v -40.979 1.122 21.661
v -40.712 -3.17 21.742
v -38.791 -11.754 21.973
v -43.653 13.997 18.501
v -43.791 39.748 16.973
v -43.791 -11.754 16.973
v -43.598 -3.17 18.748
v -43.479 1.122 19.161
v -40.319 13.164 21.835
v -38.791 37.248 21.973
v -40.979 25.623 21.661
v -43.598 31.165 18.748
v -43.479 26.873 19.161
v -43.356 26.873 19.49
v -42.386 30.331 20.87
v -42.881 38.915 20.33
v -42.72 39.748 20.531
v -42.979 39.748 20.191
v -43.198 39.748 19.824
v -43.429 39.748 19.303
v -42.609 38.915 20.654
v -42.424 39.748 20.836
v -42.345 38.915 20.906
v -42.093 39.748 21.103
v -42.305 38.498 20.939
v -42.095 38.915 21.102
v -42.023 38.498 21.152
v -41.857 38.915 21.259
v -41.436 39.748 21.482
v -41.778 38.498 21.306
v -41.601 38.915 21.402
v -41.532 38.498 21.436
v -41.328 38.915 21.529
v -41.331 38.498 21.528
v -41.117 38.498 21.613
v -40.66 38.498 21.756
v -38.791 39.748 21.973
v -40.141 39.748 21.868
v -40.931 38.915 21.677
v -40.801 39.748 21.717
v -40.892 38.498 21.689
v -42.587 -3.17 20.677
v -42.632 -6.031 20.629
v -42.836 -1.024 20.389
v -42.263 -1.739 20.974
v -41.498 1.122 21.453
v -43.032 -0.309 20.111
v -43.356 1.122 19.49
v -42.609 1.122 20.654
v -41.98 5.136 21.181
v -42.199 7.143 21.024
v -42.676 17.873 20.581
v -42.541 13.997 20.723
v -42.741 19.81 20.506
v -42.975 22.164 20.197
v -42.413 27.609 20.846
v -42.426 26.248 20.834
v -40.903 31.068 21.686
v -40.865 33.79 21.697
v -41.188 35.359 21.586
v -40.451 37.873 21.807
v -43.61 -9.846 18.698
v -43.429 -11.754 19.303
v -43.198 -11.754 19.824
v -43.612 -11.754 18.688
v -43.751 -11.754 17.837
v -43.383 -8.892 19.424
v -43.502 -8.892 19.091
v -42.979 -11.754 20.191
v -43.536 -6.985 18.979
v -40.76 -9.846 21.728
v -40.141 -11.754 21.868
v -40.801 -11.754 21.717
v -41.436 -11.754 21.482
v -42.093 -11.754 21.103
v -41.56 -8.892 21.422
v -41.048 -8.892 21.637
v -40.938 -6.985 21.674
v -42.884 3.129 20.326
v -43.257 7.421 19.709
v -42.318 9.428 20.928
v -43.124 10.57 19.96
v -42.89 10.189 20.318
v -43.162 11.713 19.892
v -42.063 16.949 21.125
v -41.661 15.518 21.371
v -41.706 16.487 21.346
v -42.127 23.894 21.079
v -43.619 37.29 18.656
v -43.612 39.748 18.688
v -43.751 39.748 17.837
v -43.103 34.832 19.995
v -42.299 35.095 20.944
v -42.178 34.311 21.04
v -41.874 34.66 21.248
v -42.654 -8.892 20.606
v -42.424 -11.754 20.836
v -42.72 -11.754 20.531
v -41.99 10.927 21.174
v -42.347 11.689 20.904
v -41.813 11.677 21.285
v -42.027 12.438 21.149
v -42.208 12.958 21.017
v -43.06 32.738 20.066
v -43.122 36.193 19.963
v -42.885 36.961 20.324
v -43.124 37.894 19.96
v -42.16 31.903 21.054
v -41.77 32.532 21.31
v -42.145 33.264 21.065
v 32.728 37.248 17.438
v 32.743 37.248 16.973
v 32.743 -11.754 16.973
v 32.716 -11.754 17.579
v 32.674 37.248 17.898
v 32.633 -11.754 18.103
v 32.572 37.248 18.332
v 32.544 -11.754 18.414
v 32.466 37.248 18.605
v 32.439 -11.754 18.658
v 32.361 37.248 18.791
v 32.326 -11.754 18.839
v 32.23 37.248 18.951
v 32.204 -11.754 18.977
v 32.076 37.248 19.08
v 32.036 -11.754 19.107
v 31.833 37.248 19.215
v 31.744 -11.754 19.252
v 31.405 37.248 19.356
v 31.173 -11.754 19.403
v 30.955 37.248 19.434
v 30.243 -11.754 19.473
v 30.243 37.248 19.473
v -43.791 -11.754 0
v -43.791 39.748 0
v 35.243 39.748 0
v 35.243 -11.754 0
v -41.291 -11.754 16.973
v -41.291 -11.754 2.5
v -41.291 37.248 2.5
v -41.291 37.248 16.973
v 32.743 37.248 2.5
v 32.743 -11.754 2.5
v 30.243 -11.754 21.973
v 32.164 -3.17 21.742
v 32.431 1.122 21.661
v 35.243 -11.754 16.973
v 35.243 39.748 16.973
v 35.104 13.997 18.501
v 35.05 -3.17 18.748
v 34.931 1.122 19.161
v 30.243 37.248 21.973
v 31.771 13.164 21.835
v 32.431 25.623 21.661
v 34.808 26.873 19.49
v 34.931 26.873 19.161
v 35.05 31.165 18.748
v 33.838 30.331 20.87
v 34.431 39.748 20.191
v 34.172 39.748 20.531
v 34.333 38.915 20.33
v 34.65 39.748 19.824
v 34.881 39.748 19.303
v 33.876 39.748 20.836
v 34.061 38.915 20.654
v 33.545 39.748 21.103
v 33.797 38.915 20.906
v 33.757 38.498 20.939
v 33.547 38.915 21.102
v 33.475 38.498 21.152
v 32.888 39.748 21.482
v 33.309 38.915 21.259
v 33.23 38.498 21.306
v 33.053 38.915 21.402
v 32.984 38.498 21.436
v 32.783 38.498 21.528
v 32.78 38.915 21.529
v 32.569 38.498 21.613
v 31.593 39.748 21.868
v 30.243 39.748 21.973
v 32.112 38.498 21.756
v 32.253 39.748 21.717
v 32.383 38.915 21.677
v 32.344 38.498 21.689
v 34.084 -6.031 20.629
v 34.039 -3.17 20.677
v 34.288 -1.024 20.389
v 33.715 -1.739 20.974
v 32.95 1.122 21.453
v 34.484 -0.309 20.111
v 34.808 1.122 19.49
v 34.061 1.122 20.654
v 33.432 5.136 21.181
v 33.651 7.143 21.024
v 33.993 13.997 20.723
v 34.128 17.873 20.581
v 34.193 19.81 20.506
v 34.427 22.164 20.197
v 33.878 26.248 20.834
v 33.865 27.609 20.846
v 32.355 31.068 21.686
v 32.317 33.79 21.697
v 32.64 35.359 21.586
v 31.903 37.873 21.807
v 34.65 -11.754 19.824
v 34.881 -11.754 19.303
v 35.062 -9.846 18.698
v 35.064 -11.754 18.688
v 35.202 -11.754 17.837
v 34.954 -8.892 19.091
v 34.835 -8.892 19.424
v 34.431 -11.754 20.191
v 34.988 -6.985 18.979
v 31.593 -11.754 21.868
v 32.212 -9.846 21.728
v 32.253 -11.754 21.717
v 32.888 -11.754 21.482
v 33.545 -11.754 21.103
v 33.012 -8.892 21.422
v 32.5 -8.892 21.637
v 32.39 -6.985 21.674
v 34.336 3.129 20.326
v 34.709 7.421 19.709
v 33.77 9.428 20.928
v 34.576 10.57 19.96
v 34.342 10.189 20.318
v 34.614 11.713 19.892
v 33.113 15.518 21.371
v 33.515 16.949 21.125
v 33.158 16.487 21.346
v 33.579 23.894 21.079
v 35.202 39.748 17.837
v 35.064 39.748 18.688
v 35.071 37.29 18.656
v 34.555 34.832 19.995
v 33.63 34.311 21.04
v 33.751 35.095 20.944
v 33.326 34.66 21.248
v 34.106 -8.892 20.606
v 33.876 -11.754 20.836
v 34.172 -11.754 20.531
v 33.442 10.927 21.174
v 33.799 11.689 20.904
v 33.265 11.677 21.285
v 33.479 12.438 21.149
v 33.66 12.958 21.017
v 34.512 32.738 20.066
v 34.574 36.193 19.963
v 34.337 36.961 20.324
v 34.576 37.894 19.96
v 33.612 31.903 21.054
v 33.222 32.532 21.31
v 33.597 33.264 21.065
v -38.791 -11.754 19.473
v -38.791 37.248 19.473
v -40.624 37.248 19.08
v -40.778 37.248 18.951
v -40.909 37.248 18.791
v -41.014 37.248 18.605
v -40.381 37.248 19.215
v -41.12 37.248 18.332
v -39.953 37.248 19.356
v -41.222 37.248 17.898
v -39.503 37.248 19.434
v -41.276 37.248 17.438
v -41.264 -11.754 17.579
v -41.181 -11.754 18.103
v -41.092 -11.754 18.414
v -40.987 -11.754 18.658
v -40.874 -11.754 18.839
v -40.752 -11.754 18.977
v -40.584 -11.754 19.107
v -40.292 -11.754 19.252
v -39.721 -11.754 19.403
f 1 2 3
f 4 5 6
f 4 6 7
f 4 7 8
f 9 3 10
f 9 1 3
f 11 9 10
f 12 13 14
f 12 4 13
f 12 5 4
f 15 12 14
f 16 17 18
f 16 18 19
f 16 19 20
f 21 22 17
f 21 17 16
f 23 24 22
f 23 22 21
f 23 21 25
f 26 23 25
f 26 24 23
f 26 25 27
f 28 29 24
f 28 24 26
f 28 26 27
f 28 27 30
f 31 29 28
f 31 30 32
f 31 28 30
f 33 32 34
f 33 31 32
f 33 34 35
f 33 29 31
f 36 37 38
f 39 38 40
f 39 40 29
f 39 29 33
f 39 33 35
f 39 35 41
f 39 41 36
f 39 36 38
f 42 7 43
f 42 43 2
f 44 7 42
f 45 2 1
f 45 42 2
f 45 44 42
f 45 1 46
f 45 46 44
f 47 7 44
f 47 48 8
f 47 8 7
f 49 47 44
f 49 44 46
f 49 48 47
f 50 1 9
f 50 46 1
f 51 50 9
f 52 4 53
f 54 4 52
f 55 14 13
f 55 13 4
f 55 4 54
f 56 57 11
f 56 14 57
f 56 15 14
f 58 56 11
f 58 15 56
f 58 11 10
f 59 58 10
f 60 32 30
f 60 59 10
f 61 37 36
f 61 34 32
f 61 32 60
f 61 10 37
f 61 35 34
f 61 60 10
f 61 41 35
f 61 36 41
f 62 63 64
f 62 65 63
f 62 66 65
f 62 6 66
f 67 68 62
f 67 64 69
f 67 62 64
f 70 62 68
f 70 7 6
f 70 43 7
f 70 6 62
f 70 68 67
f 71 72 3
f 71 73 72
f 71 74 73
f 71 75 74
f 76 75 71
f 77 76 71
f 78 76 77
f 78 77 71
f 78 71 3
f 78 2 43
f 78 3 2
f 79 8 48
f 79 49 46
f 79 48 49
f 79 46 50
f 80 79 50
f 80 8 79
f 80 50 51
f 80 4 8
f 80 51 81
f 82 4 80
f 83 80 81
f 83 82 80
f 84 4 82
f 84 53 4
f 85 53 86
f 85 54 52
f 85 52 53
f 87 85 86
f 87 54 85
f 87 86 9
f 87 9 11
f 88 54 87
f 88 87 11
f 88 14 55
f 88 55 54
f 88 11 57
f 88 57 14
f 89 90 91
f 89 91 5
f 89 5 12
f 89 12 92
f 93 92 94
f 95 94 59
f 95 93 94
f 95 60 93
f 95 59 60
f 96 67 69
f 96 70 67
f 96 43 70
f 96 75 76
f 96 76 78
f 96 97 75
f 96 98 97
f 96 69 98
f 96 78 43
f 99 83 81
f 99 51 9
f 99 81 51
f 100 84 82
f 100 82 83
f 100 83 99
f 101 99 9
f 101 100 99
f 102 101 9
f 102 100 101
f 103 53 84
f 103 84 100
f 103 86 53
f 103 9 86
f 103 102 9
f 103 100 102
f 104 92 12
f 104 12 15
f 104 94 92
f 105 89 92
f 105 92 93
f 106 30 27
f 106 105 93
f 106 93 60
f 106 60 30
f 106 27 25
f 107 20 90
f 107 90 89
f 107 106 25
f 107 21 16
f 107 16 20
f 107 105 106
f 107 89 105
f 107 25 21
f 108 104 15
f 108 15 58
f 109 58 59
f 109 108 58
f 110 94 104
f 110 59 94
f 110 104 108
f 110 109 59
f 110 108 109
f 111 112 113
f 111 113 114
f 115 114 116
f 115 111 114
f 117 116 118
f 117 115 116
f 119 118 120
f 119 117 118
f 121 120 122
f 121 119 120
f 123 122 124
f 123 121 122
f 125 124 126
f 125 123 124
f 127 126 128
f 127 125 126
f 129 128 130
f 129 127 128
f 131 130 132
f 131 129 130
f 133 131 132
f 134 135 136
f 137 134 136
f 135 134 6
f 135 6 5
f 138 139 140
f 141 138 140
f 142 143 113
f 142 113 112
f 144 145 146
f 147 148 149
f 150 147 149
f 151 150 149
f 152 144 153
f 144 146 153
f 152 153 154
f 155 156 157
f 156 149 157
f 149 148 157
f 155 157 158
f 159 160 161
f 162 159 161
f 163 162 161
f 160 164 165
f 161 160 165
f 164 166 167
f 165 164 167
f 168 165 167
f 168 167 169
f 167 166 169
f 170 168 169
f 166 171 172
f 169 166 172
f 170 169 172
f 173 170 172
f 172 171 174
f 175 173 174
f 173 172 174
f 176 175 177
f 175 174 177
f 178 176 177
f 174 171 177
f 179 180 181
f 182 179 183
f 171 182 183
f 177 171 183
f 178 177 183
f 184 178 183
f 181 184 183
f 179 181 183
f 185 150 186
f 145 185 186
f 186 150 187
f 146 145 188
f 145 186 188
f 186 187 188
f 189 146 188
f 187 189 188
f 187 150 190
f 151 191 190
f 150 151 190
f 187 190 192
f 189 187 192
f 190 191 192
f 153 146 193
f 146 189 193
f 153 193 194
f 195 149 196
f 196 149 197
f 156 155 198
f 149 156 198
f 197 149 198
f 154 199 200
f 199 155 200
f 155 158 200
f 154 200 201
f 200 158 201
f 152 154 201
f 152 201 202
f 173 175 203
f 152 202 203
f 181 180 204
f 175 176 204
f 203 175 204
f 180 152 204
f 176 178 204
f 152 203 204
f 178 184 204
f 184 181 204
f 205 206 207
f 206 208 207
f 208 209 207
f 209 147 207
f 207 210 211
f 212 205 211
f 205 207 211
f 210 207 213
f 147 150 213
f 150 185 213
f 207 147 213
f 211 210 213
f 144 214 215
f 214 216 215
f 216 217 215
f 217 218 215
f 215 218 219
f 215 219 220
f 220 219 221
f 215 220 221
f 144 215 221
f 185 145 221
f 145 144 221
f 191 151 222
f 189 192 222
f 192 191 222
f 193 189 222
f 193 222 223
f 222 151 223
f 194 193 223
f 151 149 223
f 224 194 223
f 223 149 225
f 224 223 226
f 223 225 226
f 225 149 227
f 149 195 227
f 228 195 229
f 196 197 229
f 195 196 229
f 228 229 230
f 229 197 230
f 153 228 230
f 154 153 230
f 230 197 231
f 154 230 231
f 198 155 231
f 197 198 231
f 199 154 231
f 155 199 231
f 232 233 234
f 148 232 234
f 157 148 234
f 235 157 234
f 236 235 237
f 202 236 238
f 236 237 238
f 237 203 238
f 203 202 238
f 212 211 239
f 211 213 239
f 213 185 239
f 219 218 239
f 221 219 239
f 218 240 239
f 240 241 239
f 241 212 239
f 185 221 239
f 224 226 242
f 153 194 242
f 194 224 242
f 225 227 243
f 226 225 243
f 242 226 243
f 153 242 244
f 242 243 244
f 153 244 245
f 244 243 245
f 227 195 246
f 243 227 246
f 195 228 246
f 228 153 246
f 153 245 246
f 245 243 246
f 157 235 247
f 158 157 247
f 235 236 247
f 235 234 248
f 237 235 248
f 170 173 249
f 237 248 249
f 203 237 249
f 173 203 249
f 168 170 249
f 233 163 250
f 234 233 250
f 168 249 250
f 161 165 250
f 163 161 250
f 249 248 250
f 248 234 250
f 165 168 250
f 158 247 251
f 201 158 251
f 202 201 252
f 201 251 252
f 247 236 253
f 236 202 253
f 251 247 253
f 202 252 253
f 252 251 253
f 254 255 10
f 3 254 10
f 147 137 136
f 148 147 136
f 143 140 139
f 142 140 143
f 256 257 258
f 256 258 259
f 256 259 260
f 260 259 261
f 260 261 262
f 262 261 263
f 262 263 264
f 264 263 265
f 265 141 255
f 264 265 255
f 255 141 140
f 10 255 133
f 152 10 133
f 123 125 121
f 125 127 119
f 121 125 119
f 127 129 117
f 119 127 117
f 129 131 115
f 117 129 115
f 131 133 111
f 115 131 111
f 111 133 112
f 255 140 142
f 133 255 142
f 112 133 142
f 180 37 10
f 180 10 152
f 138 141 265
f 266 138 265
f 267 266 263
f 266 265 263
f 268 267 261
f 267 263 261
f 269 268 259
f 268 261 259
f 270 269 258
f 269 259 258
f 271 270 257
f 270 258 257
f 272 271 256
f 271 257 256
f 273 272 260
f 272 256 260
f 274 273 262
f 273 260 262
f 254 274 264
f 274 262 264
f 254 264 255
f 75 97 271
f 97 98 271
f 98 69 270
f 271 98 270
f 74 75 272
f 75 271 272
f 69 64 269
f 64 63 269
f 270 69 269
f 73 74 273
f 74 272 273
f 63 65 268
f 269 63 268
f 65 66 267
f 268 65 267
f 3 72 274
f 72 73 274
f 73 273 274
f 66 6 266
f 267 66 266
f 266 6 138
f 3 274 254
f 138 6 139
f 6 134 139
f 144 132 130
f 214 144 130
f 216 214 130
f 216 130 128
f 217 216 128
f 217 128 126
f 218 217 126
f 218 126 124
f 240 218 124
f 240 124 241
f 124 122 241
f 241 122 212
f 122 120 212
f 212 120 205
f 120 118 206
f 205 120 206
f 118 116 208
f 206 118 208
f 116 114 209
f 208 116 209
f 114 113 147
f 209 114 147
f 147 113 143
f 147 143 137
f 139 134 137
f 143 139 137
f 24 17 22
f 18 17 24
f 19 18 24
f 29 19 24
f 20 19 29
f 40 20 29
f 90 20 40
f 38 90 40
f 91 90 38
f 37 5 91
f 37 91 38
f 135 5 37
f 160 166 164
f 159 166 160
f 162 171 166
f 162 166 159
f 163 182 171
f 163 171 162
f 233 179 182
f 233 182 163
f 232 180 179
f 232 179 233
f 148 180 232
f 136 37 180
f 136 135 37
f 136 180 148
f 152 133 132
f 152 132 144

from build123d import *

# Parameters (mm, degrees)
F0_W        = 79.0347680449
F0_H        = 51.5021067113
F1_DEPTH    = 21.9734124839
F2_T1_DEPTH = 76.5021067113
F3_T        = 2.5


# Not quite as in the source:
# - a fillet or chamfer that OpenCascade refuses, or shapes differently, is made with other operations: its cross-section is extruded or revolved along the edge and cut away or added
# - a shell that OpenCascade refuses in one call is made with other operations: the cavity is built on its own and cut out


with BuildPart() as f1:
    # F0 (on Top) → F1 (new body)
    with BuildSketch(Plane.XY):
        with Locations((-4.2740143836, 13.997332193)):
            Rectangle(F0_W, F0_H)
    extrude(amount=F1_DEPTH)

    # F2: fillet of radius 5 on 2 edges, made by hand

    # F2_s2 → F2_t1 (cut)
    with BuildSketch(Plane.XZ.offset(-52.2483855486)):
        with BuildLine():
            add(Edge.make_bspline(
                [(-43.791398406, 16.9734124839), (-43.791398406, 21.9734124839), (-38.791398406, 21.9734124839)],
                knots=[0, 0, 0, 1, 1, 1], degree=2, weights=[1, 1, 1]))
            Line((-38.791398406, 21.9734124839), (-43.791398406, 21.9734124839))
            Line((-43.791398406, 21.9734124839), (-43.791398406, 16.9734124839))
        make_face()
        with BuildLine():
            add(Edge.make_bspline(
                [(35.2433696389, 16.9734124839), (35.2433696389, 21.9734124839), (30.2433696389, 21.9734124839)],
                knots=[0, 0, 0, 1, 1, 1], degree=2, weights=[1, 1, 1]))
            Line((30.2433696389, 21.9734124839), (35.2433696389, 21.9734124839))
            Line((35.2433696389, 21.9734124839), (35.2433696389, 16.9734124839))
        make_face()
    extrude(amount=F2_T1_DEPTH, mode=Mode.SUBTRACT)

    # F3: shell of thickness 2.5, made by hand


with BuildPart() as f3_core1:
    # F3_t2: copy of F1
    add(f1.part)

    # the walls: a layer under each face that stays
    f3_faces = [f3_core1.faces().sort_by_distance(p)[0] for p in [
        (-43.791398406, 13.997332193, 8.4867062419),
        (-4.2740143836, 13.997332193, 0),
        (-42.541398406, 13.997332193, 20.7234124839),
        (-4.2740143836, 39.7483855486, 10.986706242),
        (35.2433696389, 13.997332193, 8.4867062419),
        (33.9933696389, 13.997332193, 20.7234124839),
    ]]
    thicken(f3_faces, amount=-F3_T, mode=Mode.SUBTRACT)


with BuildPart() as f1_1:
    add(f1.part)

    # what is left inside the walls is the cavity
    f3_cavity = [f3_core1.part.solids().sort_by_distance(p)[0] for p in [
        (-4.274014, 4.580314, 2.525),
    ]]
    add(f3_cavity, mode=Mode.SUBTRACT)


solid = f1_1.part
